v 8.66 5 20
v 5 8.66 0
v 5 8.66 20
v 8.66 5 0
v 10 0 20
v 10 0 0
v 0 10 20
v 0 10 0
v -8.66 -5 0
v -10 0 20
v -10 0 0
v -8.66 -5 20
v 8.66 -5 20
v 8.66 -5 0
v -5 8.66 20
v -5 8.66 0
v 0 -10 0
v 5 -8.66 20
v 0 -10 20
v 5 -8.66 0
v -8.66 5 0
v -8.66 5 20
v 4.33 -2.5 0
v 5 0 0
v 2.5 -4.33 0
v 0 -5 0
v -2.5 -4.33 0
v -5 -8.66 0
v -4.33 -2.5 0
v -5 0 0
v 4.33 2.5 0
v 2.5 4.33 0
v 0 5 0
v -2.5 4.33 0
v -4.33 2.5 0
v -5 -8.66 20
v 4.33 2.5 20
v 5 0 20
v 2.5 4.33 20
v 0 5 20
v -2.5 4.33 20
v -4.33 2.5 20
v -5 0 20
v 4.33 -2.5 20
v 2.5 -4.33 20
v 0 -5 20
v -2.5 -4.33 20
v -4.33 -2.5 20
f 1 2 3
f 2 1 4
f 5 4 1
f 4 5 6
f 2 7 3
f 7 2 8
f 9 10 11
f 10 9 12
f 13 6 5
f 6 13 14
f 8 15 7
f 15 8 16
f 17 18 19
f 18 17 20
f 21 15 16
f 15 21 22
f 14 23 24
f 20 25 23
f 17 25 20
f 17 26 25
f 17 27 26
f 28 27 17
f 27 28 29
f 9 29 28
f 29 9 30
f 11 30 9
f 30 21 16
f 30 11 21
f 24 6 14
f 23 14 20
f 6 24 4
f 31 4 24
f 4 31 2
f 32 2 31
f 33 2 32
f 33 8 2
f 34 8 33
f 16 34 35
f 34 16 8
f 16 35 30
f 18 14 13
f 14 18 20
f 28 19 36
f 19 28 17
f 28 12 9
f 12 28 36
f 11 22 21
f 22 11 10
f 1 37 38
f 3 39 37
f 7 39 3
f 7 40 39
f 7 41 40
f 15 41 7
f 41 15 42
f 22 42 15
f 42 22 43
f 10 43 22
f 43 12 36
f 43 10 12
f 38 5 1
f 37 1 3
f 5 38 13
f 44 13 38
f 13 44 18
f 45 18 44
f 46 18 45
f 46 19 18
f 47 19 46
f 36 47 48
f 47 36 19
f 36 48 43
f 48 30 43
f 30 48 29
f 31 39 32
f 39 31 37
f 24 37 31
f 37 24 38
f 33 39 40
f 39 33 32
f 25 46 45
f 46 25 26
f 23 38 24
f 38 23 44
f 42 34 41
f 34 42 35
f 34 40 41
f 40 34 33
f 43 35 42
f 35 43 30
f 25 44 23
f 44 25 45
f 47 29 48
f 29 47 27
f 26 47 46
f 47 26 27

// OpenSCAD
// D2 — identity through a boolean. At $fn=12 each facet subtends 30 degrees, so
// no dihedral threshold can tell the tessellation from a feature; only patch
// identity surviving the Manifold round trip keeps the side wall smooth.
difference() {
  cylinder(h = 20, r = 10, $fn = 12);
  translate([0, 0, -1]) cylinder(h = 22, r = 5, $fn = 12);
}
